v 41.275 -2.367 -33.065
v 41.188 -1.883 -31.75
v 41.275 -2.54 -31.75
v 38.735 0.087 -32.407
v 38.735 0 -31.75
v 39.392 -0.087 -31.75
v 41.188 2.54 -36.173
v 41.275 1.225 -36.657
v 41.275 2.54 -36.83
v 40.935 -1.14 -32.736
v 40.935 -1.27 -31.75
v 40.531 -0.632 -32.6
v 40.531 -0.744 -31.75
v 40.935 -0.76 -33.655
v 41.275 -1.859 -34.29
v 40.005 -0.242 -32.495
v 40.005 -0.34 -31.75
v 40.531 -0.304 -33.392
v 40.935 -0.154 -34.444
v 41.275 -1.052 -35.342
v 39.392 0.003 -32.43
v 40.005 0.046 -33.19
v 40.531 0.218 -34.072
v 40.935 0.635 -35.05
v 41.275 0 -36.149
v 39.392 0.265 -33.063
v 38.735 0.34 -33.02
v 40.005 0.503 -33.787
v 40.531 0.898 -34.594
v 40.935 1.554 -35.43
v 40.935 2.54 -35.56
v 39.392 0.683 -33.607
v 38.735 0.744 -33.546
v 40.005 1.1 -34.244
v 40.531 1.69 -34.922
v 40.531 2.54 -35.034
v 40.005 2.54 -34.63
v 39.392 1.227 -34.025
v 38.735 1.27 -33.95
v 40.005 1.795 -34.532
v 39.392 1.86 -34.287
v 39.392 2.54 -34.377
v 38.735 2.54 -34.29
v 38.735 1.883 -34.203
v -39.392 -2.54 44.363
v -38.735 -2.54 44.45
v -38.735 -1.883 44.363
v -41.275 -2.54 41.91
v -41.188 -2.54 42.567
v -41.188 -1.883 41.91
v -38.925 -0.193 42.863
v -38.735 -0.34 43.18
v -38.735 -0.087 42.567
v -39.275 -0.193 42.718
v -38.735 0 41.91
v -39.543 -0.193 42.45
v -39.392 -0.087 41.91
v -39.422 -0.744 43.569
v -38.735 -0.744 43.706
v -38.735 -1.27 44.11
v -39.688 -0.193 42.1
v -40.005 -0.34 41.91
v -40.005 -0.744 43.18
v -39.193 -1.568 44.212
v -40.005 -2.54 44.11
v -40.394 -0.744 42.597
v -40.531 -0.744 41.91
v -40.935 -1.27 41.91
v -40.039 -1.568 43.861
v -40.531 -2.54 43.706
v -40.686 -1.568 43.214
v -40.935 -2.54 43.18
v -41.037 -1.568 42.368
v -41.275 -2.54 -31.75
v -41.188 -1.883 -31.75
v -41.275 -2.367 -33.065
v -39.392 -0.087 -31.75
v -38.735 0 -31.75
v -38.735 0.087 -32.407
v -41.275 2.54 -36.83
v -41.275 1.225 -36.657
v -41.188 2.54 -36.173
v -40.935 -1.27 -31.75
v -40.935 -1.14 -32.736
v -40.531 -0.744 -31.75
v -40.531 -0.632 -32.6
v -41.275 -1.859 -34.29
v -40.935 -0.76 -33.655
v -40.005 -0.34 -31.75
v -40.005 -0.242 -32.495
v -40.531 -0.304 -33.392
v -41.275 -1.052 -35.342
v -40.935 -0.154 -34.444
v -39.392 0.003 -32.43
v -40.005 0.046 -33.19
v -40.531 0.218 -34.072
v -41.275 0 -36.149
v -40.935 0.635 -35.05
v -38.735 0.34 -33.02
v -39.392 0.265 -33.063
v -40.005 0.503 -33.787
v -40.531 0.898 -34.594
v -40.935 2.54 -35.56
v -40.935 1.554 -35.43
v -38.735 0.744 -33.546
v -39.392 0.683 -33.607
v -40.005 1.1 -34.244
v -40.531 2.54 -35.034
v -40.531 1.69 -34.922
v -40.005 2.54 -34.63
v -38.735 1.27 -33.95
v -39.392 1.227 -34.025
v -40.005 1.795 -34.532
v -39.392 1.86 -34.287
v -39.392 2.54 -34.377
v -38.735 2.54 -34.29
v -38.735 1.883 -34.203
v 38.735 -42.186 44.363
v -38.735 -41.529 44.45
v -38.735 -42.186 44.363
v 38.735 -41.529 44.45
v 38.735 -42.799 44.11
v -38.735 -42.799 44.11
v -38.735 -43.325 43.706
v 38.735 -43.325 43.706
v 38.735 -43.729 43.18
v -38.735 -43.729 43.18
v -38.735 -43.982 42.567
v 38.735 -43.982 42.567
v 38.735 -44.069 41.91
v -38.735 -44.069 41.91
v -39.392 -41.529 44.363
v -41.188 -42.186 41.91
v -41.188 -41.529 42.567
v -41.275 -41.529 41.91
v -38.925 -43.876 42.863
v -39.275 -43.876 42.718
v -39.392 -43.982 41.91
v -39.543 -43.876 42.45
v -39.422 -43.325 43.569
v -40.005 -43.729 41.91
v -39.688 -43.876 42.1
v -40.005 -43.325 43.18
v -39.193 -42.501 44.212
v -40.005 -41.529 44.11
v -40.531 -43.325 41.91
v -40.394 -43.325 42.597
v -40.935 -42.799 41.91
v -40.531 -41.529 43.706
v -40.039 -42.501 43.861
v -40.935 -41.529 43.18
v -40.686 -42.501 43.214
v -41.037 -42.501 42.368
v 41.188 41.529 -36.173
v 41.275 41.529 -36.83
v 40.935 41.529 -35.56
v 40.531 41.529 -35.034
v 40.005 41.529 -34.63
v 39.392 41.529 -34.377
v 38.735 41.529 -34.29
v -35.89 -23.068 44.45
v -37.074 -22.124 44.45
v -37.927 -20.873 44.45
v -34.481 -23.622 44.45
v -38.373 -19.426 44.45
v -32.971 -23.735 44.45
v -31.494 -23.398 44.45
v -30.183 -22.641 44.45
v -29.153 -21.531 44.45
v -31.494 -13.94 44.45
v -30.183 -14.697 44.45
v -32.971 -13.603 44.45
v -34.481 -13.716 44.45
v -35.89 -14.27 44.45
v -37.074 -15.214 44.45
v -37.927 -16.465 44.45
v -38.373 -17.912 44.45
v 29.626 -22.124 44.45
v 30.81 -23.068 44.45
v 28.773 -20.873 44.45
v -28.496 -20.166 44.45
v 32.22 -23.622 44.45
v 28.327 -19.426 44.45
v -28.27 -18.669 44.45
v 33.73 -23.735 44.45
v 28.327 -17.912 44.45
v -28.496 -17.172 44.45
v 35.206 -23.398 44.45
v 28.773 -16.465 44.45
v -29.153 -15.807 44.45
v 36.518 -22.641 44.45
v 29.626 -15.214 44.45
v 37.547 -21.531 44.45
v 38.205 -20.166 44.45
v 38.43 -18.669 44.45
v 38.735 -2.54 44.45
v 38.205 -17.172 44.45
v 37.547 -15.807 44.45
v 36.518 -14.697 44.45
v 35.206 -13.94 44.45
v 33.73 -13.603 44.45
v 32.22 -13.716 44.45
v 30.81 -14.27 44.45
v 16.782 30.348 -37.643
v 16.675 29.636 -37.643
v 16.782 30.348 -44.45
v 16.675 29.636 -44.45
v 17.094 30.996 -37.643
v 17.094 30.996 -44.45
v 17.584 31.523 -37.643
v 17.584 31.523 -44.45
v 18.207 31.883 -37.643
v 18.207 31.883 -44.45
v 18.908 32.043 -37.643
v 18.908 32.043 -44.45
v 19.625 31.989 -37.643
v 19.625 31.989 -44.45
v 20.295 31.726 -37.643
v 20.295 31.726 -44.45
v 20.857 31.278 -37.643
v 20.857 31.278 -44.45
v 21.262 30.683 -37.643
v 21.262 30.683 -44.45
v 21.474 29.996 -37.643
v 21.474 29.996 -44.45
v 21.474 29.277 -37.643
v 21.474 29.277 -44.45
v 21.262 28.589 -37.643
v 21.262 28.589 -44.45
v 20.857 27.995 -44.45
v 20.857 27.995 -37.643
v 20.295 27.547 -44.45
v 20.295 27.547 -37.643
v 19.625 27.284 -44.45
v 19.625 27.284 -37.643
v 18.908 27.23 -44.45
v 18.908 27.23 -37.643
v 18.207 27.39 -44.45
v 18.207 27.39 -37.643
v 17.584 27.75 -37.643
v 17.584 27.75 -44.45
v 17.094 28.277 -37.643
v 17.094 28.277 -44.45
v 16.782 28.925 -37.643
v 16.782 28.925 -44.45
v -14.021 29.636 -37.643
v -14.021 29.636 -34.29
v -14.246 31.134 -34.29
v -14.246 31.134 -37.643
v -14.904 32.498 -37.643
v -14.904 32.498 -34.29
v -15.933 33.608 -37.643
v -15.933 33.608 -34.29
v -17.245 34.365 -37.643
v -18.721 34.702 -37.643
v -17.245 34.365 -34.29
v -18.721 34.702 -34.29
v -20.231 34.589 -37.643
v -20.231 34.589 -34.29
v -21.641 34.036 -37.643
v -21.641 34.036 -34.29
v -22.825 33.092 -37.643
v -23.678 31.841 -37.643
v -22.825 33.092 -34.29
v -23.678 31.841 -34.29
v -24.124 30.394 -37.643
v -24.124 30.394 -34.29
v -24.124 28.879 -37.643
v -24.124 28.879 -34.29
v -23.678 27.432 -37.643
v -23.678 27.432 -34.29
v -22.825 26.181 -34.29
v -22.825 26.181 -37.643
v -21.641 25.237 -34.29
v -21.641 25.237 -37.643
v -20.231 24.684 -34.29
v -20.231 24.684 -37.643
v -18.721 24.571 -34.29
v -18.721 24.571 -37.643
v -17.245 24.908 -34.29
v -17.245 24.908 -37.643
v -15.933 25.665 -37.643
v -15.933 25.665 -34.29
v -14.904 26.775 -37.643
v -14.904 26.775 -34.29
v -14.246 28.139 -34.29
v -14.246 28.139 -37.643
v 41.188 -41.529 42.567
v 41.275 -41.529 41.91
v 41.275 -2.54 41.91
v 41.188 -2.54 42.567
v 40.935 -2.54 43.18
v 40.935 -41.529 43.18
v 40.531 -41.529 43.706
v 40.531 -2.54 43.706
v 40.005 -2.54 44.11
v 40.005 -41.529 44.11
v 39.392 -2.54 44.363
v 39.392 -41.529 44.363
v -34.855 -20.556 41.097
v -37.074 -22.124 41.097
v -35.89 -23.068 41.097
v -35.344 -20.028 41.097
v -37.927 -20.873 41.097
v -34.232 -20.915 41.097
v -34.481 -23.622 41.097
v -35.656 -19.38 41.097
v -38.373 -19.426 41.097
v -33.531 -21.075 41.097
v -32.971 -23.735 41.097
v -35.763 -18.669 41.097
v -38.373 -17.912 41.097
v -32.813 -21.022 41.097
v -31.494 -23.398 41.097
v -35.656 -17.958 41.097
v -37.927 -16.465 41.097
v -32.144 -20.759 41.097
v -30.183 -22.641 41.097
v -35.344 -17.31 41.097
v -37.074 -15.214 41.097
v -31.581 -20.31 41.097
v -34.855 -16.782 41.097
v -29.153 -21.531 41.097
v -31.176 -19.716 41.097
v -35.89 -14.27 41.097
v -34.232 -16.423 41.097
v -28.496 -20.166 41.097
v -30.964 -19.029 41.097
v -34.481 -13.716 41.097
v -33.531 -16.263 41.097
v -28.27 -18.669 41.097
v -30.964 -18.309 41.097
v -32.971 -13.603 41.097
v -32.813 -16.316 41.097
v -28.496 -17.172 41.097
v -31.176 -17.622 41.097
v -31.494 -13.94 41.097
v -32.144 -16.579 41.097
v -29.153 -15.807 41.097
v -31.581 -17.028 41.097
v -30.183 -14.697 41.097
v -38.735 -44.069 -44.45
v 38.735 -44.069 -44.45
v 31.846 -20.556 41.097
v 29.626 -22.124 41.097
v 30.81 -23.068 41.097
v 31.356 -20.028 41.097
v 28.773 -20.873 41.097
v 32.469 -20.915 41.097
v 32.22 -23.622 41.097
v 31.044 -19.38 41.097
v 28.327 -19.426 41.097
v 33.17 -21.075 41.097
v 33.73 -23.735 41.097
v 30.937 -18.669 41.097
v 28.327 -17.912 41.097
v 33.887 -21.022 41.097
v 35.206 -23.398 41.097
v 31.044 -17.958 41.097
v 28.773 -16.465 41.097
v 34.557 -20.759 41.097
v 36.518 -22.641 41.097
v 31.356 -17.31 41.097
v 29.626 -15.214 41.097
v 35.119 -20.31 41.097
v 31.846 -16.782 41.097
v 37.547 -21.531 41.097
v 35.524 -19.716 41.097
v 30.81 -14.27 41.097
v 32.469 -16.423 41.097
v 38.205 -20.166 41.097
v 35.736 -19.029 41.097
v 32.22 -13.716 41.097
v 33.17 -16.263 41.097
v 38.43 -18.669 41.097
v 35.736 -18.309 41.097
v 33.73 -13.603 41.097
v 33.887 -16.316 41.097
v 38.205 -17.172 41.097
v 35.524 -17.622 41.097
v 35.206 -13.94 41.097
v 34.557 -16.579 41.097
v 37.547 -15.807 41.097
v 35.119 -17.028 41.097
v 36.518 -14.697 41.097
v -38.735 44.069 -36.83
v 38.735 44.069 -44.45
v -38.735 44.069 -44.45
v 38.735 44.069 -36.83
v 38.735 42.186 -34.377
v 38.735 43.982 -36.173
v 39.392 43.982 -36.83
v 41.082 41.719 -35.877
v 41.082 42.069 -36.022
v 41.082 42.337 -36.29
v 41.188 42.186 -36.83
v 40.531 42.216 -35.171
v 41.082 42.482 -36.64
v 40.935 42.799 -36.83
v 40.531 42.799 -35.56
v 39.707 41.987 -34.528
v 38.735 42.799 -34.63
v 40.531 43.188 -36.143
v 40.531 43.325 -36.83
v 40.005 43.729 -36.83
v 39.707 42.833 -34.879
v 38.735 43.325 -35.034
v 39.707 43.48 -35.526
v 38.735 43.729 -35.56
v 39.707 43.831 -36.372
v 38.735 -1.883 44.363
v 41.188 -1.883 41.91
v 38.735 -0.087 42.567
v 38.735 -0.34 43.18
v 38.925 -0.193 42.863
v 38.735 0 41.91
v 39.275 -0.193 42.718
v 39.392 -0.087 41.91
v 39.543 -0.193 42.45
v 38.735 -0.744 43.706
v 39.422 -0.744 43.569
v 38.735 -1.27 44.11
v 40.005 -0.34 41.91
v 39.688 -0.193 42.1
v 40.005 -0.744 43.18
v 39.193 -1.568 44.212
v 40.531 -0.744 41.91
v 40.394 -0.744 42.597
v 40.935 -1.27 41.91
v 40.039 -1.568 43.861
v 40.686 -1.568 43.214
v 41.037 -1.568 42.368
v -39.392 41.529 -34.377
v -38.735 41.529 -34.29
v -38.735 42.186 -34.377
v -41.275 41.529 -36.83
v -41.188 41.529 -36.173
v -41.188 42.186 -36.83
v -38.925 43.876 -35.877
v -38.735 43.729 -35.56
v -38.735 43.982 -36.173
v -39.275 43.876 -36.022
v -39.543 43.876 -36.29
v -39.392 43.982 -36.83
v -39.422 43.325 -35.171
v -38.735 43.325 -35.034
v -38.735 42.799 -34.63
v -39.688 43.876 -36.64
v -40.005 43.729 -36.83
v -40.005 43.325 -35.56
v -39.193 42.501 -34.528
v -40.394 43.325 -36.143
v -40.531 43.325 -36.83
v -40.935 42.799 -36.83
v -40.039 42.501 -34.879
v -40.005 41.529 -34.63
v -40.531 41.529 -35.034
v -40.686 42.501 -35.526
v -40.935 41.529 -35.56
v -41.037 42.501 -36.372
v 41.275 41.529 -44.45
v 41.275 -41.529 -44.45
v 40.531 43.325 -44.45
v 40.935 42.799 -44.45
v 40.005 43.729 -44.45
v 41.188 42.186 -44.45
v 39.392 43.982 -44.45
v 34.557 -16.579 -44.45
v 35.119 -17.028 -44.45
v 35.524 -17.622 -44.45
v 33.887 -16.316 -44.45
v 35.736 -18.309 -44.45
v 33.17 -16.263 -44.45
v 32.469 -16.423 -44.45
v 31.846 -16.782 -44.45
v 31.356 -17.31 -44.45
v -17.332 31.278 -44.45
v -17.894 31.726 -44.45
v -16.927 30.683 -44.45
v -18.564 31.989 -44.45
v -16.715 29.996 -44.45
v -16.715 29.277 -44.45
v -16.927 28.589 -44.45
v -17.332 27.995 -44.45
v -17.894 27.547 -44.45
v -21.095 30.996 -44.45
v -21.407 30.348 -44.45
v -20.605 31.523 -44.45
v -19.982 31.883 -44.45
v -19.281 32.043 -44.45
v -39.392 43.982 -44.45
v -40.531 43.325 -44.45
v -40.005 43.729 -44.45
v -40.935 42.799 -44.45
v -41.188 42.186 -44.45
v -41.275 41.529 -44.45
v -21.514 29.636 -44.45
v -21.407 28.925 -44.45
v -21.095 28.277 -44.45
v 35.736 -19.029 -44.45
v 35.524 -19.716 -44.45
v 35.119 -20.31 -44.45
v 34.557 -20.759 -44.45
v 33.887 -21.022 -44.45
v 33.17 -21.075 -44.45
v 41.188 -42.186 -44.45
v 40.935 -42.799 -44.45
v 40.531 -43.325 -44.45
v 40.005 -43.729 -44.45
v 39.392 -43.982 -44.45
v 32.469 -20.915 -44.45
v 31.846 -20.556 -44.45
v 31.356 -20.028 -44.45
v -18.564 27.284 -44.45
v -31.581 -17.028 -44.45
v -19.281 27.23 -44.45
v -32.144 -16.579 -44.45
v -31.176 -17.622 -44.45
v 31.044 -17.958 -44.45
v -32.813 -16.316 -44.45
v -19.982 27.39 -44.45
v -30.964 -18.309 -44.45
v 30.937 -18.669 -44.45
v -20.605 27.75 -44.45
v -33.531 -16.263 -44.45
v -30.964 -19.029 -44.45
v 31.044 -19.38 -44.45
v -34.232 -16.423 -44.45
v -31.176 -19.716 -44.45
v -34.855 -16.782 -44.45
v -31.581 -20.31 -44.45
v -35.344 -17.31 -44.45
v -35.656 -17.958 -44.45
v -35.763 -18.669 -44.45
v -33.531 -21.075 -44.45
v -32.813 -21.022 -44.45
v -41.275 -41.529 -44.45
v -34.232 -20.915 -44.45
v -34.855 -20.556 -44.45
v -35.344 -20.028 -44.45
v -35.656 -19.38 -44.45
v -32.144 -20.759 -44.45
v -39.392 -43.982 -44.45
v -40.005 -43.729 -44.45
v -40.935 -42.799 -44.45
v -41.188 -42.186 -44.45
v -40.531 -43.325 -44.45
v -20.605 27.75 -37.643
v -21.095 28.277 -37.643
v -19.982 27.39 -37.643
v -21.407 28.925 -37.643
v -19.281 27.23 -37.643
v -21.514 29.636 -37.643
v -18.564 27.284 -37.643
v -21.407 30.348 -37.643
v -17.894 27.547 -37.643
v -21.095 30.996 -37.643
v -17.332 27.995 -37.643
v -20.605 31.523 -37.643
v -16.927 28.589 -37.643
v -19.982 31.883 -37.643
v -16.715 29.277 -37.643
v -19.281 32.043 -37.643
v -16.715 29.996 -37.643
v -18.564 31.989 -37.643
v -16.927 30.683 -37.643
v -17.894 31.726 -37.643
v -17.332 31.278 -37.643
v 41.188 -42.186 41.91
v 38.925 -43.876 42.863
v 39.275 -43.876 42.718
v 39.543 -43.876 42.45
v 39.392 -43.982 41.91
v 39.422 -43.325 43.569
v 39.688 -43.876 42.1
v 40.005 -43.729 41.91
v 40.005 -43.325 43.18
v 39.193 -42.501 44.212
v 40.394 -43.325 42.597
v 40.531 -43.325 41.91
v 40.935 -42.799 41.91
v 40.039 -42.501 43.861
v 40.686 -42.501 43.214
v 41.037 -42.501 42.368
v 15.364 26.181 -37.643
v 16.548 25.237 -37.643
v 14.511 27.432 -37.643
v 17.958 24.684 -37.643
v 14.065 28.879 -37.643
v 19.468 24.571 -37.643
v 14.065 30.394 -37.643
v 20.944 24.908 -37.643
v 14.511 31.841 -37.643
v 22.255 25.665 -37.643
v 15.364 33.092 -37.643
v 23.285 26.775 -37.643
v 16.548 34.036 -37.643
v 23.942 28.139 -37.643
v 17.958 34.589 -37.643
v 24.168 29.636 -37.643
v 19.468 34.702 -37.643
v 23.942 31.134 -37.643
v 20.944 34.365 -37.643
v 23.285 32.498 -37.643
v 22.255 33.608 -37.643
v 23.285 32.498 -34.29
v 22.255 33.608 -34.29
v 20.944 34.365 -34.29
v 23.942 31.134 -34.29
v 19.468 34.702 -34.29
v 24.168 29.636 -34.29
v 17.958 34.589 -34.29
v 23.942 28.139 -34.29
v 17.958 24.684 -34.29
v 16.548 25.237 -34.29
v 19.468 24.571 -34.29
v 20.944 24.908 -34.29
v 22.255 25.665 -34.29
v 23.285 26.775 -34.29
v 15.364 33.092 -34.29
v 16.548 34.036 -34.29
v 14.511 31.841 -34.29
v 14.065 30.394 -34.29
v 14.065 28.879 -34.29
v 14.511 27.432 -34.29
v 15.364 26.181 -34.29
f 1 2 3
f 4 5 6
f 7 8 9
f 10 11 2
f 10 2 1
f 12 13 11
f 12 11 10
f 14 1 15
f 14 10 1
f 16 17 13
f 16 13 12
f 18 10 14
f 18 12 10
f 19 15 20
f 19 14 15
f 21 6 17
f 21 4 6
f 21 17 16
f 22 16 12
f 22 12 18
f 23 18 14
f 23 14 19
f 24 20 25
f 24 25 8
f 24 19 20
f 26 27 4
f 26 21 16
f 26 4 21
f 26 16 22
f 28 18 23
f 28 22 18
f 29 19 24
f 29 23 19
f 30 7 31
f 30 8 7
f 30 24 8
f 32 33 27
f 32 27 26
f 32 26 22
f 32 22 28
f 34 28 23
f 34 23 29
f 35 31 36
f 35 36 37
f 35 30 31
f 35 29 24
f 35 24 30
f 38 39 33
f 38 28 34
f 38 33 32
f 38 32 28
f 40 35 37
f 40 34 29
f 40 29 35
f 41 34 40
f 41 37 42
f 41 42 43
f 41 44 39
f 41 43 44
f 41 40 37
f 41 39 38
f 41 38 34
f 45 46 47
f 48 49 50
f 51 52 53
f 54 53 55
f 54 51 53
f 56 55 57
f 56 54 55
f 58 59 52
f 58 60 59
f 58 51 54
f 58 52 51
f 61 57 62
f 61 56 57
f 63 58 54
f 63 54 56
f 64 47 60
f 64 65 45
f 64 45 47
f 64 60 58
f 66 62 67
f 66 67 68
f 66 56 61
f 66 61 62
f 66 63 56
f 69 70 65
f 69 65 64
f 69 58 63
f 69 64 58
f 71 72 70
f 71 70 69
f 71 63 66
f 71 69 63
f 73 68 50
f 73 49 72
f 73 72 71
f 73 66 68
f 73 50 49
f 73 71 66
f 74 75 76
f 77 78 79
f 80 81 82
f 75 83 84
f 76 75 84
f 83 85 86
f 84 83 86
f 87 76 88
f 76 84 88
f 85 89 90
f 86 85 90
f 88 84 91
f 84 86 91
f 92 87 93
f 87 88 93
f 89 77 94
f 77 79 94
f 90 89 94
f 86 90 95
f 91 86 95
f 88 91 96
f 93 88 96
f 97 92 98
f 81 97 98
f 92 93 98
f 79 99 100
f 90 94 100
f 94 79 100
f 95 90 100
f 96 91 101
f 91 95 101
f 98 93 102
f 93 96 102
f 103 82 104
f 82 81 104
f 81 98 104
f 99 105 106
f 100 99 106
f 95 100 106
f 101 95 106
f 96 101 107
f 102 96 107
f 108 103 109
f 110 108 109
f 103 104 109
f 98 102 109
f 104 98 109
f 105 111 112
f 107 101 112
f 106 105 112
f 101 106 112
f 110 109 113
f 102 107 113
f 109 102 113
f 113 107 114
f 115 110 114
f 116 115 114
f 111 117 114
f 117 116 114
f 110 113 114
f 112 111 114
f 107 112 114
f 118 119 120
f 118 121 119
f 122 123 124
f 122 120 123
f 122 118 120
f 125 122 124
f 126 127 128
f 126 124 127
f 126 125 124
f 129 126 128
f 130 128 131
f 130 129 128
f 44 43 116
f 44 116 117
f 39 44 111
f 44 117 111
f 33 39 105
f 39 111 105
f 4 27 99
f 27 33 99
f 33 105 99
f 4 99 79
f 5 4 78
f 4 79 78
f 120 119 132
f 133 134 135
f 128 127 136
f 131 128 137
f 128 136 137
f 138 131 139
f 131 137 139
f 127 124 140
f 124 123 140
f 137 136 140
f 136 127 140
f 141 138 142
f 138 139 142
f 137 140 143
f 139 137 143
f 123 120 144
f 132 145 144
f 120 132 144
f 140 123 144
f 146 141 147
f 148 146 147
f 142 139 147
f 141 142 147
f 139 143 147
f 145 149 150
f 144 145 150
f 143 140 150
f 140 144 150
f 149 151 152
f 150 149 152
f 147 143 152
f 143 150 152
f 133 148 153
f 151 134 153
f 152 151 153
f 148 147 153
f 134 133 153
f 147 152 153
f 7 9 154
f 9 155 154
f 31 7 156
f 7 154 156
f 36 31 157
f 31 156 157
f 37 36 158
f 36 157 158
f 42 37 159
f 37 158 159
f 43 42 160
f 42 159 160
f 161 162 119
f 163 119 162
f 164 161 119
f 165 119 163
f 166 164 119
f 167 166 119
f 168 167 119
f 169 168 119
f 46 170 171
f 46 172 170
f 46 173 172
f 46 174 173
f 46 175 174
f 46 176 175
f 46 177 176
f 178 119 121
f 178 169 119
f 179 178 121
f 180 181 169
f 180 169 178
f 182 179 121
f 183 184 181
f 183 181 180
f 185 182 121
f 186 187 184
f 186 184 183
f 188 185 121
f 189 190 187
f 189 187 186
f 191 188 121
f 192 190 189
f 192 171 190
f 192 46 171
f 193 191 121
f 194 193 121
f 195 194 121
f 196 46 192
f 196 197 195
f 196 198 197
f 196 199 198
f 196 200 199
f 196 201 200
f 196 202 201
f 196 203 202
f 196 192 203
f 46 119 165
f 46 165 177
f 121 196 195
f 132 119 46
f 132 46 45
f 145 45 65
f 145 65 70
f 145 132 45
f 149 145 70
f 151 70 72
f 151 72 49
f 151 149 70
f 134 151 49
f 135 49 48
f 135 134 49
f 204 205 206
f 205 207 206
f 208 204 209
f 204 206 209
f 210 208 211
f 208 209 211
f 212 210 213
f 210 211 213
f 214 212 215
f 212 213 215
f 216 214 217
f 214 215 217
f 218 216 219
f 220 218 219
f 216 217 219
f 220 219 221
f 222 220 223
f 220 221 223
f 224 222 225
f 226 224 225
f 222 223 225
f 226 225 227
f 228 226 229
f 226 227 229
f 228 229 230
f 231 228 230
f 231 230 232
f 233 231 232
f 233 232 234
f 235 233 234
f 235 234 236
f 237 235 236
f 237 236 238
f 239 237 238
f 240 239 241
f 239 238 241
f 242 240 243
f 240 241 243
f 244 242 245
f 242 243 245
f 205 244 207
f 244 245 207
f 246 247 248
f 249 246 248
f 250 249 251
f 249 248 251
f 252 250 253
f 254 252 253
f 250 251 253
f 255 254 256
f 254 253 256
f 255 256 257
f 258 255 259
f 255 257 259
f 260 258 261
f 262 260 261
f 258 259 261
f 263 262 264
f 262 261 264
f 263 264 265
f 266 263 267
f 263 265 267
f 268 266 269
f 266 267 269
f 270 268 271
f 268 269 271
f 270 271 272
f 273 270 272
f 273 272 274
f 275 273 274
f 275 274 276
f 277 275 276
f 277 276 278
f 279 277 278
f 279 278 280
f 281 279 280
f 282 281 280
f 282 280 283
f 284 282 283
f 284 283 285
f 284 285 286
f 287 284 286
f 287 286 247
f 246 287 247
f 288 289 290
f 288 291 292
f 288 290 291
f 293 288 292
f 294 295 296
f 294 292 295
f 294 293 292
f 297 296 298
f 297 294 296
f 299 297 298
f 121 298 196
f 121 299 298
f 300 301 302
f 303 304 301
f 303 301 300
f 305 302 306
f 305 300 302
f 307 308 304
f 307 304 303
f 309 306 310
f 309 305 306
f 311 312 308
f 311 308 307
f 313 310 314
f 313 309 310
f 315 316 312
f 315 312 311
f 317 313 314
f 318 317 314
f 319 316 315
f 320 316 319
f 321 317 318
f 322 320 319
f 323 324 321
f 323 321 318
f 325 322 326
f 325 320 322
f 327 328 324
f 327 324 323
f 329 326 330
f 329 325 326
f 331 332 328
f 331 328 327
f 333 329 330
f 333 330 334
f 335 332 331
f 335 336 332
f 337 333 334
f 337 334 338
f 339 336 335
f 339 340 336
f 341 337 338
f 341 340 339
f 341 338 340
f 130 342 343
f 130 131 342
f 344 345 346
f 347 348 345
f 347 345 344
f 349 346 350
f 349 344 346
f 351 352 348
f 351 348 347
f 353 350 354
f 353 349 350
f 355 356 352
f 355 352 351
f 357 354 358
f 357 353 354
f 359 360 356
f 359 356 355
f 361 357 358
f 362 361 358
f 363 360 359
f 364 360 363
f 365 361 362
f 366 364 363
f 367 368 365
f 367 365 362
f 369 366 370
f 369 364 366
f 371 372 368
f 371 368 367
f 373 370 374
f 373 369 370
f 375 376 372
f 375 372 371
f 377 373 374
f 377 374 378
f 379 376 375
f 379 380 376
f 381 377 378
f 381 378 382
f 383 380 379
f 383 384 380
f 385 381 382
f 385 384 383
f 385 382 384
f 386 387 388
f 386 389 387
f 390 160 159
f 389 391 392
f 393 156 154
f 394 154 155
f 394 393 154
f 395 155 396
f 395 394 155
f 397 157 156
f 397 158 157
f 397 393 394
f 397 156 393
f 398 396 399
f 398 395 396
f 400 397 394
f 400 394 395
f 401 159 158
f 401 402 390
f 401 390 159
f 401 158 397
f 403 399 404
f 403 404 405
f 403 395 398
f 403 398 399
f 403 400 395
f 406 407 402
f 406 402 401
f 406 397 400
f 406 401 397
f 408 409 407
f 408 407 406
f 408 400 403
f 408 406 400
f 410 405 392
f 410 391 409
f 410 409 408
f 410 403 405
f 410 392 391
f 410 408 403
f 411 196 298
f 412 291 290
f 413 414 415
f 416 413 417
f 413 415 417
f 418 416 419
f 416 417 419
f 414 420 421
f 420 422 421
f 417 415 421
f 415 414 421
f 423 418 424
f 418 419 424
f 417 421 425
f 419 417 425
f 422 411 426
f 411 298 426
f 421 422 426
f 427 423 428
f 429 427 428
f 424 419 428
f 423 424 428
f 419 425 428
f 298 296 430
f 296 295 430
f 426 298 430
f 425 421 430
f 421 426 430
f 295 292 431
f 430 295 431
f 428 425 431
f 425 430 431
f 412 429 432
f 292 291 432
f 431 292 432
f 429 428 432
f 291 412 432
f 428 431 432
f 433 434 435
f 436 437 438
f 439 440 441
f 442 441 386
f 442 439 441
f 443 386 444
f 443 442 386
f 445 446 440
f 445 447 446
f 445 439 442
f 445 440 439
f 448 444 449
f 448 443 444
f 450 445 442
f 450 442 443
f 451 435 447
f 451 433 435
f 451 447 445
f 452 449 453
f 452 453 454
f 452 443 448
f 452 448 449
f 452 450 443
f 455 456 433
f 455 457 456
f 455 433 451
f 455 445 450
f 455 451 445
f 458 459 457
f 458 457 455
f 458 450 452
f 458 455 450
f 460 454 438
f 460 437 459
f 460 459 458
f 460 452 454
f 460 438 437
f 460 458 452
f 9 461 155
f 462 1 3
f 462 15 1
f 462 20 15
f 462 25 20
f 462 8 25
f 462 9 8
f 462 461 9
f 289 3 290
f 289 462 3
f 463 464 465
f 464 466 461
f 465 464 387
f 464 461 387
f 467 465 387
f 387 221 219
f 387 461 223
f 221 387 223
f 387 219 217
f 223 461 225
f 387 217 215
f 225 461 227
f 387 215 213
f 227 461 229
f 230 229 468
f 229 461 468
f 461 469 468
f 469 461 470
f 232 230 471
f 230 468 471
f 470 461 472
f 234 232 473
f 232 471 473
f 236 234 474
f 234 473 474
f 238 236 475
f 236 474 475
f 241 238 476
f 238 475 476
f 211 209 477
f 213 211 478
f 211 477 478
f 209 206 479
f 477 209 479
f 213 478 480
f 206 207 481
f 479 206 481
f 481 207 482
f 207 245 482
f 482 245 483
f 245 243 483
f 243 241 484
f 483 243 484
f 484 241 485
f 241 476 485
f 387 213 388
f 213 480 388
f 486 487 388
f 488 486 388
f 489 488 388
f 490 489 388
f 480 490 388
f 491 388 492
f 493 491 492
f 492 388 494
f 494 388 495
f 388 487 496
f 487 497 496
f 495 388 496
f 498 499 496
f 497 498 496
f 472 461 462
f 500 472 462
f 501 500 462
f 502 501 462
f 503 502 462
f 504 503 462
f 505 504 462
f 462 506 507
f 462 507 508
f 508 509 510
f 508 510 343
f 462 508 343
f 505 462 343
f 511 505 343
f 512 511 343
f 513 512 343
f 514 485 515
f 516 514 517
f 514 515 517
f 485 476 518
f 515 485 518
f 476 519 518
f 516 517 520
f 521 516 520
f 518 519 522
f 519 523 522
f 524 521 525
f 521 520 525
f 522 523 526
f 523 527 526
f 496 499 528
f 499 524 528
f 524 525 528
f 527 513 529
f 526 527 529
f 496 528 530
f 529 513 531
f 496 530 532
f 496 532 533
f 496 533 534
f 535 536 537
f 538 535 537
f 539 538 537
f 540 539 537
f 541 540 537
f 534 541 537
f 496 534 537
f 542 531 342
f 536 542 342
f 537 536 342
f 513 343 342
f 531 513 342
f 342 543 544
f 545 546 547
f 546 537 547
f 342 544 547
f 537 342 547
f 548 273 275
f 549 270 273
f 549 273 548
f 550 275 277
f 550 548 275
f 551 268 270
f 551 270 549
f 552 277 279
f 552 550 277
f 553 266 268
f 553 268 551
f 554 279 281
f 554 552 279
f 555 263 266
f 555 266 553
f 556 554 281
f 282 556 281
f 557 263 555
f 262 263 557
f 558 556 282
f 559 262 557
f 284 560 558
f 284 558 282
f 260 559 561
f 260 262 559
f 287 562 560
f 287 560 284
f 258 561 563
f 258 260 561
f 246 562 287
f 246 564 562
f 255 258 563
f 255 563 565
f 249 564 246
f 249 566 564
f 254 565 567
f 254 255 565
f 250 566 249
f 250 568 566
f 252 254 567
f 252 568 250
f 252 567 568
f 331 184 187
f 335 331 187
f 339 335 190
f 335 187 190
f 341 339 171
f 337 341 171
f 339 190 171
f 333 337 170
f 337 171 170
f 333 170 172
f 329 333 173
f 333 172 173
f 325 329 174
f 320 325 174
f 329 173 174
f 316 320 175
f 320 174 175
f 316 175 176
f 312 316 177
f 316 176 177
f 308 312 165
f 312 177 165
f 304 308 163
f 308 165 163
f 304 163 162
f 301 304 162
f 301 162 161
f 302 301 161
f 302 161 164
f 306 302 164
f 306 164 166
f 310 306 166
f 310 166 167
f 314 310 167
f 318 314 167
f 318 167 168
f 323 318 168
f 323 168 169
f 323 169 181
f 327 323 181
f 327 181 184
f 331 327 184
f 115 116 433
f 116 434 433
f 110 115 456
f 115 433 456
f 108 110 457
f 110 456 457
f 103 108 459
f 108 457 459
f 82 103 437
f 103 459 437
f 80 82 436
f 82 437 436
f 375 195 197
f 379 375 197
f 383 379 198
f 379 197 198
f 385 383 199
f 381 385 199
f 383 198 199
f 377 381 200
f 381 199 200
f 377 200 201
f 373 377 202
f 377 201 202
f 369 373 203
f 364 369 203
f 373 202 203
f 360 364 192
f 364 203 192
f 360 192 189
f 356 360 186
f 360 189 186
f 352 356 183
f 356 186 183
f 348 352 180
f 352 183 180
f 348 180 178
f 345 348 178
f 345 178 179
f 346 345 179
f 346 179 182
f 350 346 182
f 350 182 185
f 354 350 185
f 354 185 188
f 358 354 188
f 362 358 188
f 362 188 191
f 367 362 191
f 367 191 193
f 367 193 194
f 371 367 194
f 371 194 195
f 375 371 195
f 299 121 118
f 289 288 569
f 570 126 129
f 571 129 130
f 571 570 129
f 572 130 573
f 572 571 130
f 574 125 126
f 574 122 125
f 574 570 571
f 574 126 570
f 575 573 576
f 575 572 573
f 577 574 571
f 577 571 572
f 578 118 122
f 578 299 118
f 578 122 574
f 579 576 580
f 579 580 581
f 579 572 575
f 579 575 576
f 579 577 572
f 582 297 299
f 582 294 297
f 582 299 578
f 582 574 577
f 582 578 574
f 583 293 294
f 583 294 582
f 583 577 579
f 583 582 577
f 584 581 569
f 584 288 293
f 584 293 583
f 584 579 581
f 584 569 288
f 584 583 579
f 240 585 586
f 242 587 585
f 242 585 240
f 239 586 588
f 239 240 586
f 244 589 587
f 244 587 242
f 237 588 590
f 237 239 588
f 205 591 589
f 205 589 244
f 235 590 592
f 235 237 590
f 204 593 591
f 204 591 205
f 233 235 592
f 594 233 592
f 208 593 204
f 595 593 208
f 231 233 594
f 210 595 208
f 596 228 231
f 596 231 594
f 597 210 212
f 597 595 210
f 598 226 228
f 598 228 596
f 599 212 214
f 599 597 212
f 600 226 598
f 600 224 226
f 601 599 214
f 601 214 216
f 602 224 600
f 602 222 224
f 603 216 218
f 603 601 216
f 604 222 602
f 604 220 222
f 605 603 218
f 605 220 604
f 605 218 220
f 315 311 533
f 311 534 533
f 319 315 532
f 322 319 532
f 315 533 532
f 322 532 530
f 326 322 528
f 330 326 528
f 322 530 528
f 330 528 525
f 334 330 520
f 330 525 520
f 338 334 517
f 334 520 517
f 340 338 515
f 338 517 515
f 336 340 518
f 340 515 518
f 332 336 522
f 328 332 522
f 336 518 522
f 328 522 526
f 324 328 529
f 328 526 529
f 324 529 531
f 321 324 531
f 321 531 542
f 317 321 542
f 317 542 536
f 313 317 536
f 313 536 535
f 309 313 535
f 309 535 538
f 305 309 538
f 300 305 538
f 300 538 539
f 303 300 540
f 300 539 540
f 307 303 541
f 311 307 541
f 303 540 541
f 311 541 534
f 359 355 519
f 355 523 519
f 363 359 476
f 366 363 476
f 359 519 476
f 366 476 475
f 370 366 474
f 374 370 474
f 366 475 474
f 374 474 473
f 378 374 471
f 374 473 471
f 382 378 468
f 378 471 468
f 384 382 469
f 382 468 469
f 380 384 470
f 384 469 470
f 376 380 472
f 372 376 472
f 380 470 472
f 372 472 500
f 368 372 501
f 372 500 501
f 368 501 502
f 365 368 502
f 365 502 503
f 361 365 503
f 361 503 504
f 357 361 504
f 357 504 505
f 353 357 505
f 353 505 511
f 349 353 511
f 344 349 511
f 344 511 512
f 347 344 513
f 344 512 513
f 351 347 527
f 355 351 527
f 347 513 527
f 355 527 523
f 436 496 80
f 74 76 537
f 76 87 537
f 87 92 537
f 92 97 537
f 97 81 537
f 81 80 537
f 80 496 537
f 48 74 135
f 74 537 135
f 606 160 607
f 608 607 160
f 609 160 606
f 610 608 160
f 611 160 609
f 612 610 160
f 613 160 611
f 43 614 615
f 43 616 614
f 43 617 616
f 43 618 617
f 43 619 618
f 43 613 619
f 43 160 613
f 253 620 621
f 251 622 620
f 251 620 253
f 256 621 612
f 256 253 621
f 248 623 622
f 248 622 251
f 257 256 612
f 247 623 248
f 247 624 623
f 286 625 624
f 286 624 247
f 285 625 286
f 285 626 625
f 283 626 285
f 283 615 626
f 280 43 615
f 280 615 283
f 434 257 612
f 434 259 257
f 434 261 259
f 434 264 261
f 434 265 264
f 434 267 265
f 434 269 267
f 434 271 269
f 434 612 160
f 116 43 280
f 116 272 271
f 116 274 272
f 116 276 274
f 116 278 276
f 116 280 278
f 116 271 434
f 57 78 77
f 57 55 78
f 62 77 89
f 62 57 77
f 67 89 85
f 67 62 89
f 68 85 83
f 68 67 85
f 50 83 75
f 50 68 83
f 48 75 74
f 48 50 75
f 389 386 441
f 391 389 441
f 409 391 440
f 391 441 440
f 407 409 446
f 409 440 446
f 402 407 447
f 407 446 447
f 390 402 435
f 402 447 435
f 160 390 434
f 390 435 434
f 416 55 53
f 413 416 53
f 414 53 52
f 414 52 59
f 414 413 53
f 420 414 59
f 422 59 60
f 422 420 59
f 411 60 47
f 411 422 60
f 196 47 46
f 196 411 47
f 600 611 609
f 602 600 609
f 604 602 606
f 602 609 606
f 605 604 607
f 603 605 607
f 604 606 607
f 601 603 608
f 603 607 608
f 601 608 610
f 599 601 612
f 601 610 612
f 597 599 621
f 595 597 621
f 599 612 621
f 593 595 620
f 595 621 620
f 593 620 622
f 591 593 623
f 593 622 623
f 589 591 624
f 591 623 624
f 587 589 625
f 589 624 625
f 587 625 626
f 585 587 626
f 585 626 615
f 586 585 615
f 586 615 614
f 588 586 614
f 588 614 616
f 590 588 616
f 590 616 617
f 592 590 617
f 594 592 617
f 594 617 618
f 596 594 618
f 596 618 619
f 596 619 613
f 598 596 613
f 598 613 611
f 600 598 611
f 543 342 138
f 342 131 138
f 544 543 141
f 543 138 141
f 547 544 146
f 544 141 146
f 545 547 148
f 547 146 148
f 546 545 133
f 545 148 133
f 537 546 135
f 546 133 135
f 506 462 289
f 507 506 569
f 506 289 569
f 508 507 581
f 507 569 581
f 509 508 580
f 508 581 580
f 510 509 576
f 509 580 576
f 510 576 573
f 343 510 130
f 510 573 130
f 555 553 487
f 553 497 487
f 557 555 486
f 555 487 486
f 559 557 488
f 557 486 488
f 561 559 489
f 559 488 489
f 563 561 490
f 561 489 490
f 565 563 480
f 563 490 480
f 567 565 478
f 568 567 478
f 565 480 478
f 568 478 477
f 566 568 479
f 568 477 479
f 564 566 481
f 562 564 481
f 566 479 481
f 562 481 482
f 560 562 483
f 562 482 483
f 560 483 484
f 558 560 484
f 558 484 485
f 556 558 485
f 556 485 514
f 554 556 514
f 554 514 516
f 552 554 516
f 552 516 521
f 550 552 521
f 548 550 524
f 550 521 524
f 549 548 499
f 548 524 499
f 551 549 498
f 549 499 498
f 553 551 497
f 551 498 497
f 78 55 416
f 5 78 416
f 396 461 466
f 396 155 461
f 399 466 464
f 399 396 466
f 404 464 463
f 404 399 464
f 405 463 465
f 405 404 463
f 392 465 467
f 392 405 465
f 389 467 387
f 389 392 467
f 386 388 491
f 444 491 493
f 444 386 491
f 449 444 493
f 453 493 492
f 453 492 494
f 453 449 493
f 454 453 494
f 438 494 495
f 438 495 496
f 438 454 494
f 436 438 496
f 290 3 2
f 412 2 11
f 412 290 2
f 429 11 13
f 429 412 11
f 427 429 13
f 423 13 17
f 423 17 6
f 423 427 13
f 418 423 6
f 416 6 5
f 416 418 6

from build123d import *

# Parameters (mm, degrees)
F0_W           = 82.55
F0_H           = 88.9
F1_DEPTH       = 44.069
F2_W           = 82.55
F2_H           = 10.16
F3_DEPTH       = 44.069
F5_D           = 4.826
F5_CBORE_D     = 10.16
F5_CBORE_DEPTH = 3.3528
F6_R           = 2.54
F8_D           = 4.826
F8_CBORE_D     = 10.16
F8_CBORE_DEPTH = 3.3528


# Not quite as in the source:
# - a feature names something its author has since deleted; it is built from what else it names


with BuildPart() as f1:
    # F0 (on Front) → F1 (new body)
    with BuildSketch(Plane.XZ):
        Rectangle(F0_W, F0_H)
    extrude(amount=F1_DEPTH)

    # F2 (on face) → F3 (join)
    with BuildSketch(Plane(origin=(0, 0, 0), x_dir=(-1, 0, 0), z_dir=(0, 1, 0))):
        with Locations((0, -39.37)):
            Rectangle(F2_W, F2_H)
    extrude(amount=F3_DEPTH)

    # F5 (through all)
    with Locations(Plane.XY.offset(44.45)):
        with Locations((-33.3502, -18.669), (33.3502, -18.669)):
            CounterBoreHole(F5_D / 2, F5_CBORE_D / 2, F5_CBORE_DEPTH)

    # F6
    f6_edges = [f1.edges().sort_by_distance(p)[0] for p in [
        (-41.275, -22.0345, 44.45),
        (41.275, -22.0345, 44.45),
        (0, -44.069, 44.45),
        (0, 0, 44.45),
        (41.275, -44.069, 0),
        (41.275, 0, 5.08),
        (-41.275, -44.069, 0),
        (-41.275, 0, 5.08),
        (-41.275, 22.0345, -34.29),
        (0, 44.069, -34.29),
        (41.275, 22.0345, -34.29),
        (0, 0, -34.29),
        (41.275, 44.069, -39.37),
        (-41.275, 44.069, -39.37),
    ]]
    fillet(f6_edges, radius=F6_R)

    # F8 (through all)
    with Locations(Plane.XY.offset(-34.29)):
        with Locations((-19.1008, 29.6364016831), (19.0881, 29.6364016831)):
            CounterBoreHole(F8_D / 2, F8_CBORE_D / 2, F8_CBORE_DEPTH)


solid = f1.part
